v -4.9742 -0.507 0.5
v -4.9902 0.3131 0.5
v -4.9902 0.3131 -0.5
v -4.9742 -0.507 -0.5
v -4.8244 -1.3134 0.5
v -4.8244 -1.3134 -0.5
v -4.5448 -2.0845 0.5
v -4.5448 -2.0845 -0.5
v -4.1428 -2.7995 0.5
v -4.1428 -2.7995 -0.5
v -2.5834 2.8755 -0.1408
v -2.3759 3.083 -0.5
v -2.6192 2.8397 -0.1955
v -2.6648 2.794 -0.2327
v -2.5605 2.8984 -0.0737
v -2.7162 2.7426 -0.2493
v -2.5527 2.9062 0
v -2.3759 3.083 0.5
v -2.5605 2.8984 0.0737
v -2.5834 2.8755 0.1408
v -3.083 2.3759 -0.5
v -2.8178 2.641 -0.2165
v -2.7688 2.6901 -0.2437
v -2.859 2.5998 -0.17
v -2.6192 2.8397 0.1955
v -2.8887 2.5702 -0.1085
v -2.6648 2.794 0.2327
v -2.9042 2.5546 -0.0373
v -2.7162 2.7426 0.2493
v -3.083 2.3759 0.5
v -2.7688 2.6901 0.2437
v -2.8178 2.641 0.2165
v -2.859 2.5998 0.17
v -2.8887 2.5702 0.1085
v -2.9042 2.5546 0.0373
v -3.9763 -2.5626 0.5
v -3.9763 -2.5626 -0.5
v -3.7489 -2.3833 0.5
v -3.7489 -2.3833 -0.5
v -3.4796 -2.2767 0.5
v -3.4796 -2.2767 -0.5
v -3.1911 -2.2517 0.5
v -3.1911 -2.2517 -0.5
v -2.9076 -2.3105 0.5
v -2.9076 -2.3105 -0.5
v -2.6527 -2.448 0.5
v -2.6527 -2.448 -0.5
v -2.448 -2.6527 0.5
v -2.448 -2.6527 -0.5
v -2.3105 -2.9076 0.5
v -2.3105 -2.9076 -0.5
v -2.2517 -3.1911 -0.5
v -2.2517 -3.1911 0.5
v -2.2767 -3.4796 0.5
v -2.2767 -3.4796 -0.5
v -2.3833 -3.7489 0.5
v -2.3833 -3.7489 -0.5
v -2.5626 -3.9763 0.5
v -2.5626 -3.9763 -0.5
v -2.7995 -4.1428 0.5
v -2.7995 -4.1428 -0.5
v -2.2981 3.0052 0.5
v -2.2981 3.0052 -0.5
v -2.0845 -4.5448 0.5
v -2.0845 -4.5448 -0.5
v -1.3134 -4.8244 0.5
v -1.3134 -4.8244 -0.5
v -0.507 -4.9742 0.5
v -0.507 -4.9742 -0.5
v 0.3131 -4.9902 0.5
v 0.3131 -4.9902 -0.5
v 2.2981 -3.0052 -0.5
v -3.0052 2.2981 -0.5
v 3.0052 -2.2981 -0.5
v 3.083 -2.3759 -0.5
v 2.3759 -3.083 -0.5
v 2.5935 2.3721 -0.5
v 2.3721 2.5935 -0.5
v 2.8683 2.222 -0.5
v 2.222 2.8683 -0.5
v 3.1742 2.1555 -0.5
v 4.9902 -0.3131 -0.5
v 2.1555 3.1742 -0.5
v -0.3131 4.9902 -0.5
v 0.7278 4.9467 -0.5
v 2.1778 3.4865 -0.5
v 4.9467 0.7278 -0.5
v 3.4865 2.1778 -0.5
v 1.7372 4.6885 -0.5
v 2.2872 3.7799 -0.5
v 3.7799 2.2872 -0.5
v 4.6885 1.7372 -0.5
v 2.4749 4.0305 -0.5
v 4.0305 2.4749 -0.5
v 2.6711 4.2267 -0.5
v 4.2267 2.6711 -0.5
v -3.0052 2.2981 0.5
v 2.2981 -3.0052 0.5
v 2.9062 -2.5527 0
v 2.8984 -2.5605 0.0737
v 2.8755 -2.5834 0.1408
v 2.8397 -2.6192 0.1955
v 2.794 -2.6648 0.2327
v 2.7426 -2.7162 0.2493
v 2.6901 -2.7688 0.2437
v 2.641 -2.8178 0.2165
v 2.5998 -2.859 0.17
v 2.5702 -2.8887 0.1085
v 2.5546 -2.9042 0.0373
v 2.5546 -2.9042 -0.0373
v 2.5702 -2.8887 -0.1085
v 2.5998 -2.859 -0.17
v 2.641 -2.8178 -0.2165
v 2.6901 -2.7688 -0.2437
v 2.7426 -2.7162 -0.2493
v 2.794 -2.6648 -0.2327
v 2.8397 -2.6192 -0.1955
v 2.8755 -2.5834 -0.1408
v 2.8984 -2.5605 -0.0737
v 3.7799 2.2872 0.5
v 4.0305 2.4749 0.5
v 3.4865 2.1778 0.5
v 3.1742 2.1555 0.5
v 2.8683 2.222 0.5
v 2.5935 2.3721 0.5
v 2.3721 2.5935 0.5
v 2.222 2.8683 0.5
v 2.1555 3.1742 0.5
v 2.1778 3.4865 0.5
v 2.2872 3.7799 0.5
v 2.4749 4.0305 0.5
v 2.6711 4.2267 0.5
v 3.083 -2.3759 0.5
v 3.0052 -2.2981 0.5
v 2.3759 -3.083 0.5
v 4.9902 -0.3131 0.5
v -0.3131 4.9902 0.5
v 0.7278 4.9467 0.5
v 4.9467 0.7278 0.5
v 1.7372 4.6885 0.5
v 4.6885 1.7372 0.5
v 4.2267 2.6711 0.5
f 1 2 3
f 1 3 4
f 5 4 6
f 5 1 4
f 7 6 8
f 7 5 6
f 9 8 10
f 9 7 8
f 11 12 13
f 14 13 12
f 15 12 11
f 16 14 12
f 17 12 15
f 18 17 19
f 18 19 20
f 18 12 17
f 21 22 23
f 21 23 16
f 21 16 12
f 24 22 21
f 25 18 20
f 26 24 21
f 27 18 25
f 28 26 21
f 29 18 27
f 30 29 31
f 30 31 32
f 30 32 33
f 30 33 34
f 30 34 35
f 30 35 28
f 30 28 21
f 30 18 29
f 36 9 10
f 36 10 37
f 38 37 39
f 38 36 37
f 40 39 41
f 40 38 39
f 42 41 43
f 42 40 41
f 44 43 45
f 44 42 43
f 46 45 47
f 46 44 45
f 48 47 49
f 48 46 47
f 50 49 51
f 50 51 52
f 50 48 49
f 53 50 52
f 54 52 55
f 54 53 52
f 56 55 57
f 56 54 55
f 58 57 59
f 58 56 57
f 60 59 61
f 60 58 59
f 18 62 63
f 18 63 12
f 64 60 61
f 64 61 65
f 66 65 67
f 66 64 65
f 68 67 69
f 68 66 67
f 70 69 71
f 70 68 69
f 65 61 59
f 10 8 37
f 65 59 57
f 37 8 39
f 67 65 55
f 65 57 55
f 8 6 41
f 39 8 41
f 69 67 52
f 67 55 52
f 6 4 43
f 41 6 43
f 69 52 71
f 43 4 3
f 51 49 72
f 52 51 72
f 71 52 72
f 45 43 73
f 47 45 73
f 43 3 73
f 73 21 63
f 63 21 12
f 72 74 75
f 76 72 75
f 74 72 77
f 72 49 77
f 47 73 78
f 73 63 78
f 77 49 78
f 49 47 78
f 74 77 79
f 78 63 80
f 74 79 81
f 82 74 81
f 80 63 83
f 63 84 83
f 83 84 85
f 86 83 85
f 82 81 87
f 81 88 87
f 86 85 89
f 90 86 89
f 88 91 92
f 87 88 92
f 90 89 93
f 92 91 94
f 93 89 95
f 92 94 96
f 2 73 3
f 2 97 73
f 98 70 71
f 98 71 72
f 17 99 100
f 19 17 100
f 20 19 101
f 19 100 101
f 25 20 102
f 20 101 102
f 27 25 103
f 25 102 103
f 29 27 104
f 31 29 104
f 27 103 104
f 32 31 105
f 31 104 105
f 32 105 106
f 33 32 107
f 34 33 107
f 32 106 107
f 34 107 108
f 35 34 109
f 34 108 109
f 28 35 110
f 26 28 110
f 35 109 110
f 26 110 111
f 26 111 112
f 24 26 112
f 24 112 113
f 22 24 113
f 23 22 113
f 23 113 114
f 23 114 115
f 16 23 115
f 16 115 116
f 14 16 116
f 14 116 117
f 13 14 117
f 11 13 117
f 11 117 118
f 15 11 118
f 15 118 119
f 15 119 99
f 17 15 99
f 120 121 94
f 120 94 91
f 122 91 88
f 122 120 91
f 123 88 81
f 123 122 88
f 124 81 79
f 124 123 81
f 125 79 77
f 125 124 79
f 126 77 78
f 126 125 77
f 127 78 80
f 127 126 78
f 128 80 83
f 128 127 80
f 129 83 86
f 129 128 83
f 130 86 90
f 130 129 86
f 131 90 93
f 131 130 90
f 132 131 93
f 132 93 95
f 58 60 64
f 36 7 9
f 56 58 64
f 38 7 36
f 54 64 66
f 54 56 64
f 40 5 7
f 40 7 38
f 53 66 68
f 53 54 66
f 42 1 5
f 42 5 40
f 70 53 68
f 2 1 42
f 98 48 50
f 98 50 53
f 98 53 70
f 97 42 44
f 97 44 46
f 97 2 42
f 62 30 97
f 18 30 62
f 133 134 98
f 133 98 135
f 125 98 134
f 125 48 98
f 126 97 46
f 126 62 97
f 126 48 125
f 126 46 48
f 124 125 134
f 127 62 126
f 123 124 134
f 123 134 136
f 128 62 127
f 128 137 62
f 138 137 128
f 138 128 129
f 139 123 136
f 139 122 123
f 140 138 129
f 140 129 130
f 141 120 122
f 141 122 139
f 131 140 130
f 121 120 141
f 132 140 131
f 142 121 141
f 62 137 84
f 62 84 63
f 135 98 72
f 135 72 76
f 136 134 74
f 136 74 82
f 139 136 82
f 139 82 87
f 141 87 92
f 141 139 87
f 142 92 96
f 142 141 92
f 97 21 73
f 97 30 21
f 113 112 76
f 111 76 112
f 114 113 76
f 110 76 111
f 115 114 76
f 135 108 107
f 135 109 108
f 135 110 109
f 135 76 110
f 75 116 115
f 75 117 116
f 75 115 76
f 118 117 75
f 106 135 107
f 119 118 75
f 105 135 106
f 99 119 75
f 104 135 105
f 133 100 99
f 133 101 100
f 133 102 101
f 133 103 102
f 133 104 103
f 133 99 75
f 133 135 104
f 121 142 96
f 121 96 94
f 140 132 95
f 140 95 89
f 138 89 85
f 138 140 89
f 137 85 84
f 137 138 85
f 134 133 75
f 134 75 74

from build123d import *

# Parameters (mm, degrees)
F1_DEPTH = 0.5
F2_R     = 0.25
F3_DEPTH = 10.9320678119


with BuildPart() as f1:
    # F0 (on Top) → F1 (new body, symmetric)
    with BuildSketch(Plane.XY):
        with BuildLine():
            Line((-3.00520382, 2.2980970389), (-4.9901862962, 0.3131145627))
            ThreePointArc((-4.9901862962, 0.3131145627), (-4.8244092491, -1.3134212566), (-4.1427869129, -2.7995207794))
            ThreePointArc((-4.1427869129, -2.7995207794), (-2.5428932188, -2.5428932188), (-2.7995207794, -4.1427869129))
            ThreePointArc((-2.7995207794, -4.1427869129), (-1.3134212566, -4.8244092491), (0.3131145627, -4.9901862962))
            Line((0.3131145627, -4.9901862962), (2.2980970389, -3.00520382))
            Line((2.2980970389, -3.00520382), (2.3758787848, -3.082985566))
            Line((2.3758787848, -3.082985566), (3.082985566, -2.3758787848))
            Line((3.082985566, -2.3758787848), (3.00520382, -2.2980970389))
            Line((3.00520382, -2.2980970389), (4.9901862962, -0.3131145627))
            ThreePointArc((4.9901862962, -0.3131145627), (4.8439927049, 1.2392476245), (4.2267303315, 2.6710954129))
            Line((4.2267303315, 2.6710954129), (4.0305086528, 2.4748737342))
            ThreePointArc((4.0305086528, 2.4748737342), (2.4748737342, 2.4748737342), (2.4748737342, 4.0305086528))
            Line((2.4748737342, 4.0305086528), (2.6710954129, 4.2267303315))
            ThreePointArc((2.6710954129, 4.2267303315), (1.2392476245, 4.8439927049), (-0.3131145627, 4.9901862962))
            Line((-0.3131145627, 4.9901862962), (-2.2980970389, 3.00520382))
            Line((-2.2980970389, 3.00520382), (-2.3758787848, 3.082985566))
            Line((-2.3758787848, 3.082985566), (-3.082985566, 2.3758787848))
            Line((-3.082985566, 2.3758787848), (-3.00520382, 2.2980970389))
        make_face()
    extrude(amount=F1_DEPTH, both=True)

    # F2 (on face) → F3 (cut, through all)
    with BuildSketch(Plane(origin=(2.7294321754, -2.7294321754, 0), x_dir=(0.7071067812, 0.7071067812, 0), z_dir=(0.7071067812, -0.7071067812, 0))):
        Circle(F2_R)
    extrude(amount=-F3_DEPTH, mode=Mode.SUBTRACT)


solid = f1.part
